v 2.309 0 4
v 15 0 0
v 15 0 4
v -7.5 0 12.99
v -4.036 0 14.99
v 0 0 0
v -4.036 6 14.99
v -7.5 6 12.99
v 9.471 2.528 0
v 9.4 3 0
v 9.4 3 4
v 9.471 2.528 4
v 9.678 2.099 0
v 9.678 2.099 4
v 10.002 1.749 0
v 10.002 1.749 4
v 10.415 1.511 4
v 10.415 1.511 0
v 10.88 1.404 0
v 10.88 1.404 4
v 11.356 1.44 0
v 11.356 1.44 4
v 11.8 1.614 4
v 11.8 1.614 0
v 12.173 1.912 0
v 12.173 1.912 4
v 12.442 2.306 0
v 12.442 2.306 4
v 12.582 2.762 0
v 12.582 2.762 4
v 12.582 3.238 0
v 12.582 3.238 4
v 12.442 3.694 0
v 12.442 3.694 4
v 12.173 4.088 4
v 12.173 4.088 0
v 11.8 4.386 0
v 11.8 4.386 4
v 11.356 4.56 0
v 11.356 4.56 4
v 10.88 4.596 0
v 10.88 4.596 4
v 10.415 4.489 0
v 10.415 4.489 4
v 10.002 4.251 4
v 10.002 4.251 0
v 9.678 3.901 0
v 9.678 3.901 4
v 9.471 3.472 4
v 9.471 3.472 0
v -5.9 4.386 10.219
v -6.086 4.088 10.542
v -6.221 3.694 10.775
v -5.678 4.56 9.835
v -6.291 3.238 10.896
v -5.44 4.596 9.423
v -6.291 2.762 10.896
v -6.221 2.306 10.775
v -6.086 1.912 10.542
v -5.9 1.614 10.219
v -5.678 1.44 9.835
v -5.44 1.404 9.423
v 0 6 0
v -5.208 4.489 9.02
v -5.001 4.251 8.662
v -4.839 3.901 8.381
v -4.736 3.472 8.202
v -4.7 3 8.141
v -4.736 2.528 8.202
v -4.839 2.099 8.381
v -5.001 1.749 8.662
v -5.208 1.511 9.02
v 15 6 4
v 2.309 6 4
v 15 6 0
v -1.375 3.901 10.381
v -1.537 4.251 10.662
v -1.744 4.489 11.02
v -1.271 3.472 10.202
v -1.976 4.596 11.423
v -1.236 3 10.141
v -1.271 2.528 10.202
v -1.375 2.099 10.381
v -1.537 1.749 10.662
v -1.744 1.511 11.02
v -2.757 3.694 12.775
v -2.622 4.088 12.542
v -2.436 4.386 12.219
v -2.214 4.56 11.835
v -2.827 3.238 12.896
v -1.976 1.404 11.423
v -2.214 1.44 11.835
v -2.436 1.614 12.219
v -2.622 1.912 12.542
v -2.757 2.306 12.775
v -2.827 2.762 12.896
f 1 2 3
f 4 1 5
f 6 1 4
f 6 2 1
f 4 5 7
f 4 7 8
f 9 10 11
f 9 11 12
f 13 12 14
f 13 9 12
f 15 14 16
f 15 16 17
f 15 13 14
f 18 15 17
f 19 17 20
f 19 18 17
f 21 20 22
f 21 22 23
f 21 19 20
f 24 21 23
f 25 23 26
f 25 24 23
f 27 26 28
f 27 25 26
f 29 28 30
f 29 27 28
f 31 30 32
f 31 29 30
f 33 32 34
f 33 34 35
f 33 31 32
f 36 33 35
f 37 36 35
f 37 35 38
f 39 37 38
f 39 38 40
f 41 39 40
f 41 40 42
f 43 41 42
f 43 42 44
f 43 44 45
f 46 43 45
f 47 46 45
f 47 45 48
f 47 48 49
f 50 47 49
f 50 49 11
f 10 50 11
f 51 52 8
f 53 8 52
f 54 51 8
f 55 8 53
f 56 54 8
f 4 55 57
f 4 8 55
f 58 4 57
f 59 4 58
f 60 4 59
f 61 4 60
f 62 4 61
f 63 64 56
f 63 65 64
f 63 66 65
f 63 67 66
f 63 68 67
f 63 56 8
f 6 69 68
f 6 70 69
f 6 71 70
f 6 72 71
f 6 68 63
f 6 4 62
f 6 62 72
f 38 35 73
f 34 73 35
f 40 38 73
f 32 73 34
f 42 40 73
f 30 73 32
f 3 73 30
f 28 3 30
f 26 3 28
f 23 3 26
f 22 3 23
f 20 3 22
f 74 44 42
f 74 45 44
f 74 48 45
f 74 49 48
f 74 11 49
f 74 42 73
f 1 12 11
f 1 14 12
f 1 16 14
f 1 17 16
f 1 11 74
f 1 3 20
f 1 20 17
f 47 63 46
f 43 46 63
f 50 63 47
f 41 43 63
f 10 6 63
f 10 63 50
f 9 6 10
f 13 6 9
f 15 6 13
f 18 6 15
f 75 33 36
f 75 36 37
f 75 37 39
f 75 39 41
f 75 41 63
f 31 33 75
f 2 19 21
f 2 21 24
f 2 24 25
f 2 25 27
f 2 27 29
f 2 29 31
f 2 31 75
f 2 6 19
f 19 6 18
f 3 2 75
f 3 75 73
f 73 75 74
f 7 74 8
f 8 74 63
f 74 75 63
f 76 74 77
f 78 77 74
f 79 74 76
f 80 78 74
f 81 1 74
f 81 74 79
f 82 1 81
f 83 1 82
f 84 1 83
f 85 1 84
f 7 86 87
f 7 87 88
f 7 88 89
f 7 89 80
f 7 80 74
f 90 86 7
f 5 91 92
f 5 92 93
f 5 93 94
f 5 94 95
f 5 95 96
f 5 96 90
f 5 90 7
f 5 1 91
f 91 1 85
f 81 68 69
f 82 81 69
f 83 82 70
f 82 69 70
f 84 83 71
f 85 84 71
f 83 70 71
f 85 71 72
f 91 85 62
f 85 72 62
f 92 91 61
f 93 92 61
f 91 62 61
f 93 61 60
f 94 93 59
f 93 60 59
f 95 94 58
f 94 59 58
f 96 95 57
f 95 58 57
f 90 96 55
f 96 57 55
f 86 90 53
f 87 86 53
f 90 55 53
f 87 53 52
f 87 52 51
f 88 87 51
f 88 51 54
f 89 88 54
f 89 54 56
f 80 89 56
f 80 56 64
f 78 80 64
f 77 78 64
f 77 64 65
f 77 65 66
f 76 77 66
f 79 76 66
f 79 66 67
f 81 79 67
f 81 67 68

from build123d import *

# Parameters (mm, degrees)
EXTRUDE_1_DEPTH                 = 6
CUT_EXTRUDE_1_REACH             = 24.039
SKETCH_2_R                      = 1.6
CUT_EXTRUDE_1_DIRECTION_2_DEPTH = 23.03886395


with BuildPart() as part:
    # 草图1 → 凸台-拉伸1 (new body)
    with BuildSketch(Plane(origin=(0, 0, 0), x_dir=(1, 0, 0), z_dir=(0, 1, 0))):
        Polygon((0, 0), (15, 0), (15, -4), (2.309401077, -4), (-4.035898385, -14.990381057), (-7.5, -12.990381057), align=None)
    extrude(amount=EXTRUDE_1_DEPTH)

    # 草图2 → 切除-拉伸1 (cut, up to next)
    with BuildSketch(Plane(origin=(0, 0, 0), x_dir=(-0.4999999999999975, 0, 0.86602540378444), z_dir=(-0.86602540378444, 0, -0.4999999999999975)), mode=Mode.PRIVATE) as cut_extrude_1_sk1:
        with Locations(Location((11, 3, 0), (0, 0, 180))):
            Circle(SKETCH_2_R)
    cut_extrude_1_tool1 = extrude(cut_extrude_1_sk1.sketch, amount=-CUT_EXTRUDE_1_REACH, mode=Mode.PRIVATE) & part.part
    cut_extrude_1 = cut_extrude_1_tool1.solids().sort_by_distance((-5.5, 3, 9.526279))[0]
    add(cut_extrude_1, mode=Mode.SUBTRACT)

    # 草图2 → 切除-拉伸1 direction 2 (cut)
    with BuildSketch(Plane(origin=(0, 0, 0), x_dir=(-0.4999999999999975, 0, 0.86602540378444), z_dir=(-0.86602540378444, 0, -0.4999999999999975))):
        with Locations(Location((11, 3, 0), (0, 0, 180))):
            Circle(SKETCH_2_R)
    cut_extrude_1_direction_2 = extrude(amount=CUT_EXTRUDE_1_DIRECTION_2_DEPTH, mode=Mode.SUBTRACT)

    # 镜向1: 切除-拉伸1, 切除-拉伸1 direction 2 across plane
    add(cut_extrude_1.mirror(Plane(origin=(0, 0, 0), x_dir=(0.5000000000000012, 0, 0.8660254037844378), z_dir=(-0.866025403784438, 0, 0.5000000000000012))), mode=Mode.SUBTRACT)
    add(cut_extrude_1_direction_2.mirror(Plane(origin=(0, 0, 0), x_dir=(0.5000000000000012, 0, 0.8660254037844378), z_dir=(-0.866025403784438, 0, 0.5000000000000012))), mode=Mode.SUBTRACT)


solid = part.part
